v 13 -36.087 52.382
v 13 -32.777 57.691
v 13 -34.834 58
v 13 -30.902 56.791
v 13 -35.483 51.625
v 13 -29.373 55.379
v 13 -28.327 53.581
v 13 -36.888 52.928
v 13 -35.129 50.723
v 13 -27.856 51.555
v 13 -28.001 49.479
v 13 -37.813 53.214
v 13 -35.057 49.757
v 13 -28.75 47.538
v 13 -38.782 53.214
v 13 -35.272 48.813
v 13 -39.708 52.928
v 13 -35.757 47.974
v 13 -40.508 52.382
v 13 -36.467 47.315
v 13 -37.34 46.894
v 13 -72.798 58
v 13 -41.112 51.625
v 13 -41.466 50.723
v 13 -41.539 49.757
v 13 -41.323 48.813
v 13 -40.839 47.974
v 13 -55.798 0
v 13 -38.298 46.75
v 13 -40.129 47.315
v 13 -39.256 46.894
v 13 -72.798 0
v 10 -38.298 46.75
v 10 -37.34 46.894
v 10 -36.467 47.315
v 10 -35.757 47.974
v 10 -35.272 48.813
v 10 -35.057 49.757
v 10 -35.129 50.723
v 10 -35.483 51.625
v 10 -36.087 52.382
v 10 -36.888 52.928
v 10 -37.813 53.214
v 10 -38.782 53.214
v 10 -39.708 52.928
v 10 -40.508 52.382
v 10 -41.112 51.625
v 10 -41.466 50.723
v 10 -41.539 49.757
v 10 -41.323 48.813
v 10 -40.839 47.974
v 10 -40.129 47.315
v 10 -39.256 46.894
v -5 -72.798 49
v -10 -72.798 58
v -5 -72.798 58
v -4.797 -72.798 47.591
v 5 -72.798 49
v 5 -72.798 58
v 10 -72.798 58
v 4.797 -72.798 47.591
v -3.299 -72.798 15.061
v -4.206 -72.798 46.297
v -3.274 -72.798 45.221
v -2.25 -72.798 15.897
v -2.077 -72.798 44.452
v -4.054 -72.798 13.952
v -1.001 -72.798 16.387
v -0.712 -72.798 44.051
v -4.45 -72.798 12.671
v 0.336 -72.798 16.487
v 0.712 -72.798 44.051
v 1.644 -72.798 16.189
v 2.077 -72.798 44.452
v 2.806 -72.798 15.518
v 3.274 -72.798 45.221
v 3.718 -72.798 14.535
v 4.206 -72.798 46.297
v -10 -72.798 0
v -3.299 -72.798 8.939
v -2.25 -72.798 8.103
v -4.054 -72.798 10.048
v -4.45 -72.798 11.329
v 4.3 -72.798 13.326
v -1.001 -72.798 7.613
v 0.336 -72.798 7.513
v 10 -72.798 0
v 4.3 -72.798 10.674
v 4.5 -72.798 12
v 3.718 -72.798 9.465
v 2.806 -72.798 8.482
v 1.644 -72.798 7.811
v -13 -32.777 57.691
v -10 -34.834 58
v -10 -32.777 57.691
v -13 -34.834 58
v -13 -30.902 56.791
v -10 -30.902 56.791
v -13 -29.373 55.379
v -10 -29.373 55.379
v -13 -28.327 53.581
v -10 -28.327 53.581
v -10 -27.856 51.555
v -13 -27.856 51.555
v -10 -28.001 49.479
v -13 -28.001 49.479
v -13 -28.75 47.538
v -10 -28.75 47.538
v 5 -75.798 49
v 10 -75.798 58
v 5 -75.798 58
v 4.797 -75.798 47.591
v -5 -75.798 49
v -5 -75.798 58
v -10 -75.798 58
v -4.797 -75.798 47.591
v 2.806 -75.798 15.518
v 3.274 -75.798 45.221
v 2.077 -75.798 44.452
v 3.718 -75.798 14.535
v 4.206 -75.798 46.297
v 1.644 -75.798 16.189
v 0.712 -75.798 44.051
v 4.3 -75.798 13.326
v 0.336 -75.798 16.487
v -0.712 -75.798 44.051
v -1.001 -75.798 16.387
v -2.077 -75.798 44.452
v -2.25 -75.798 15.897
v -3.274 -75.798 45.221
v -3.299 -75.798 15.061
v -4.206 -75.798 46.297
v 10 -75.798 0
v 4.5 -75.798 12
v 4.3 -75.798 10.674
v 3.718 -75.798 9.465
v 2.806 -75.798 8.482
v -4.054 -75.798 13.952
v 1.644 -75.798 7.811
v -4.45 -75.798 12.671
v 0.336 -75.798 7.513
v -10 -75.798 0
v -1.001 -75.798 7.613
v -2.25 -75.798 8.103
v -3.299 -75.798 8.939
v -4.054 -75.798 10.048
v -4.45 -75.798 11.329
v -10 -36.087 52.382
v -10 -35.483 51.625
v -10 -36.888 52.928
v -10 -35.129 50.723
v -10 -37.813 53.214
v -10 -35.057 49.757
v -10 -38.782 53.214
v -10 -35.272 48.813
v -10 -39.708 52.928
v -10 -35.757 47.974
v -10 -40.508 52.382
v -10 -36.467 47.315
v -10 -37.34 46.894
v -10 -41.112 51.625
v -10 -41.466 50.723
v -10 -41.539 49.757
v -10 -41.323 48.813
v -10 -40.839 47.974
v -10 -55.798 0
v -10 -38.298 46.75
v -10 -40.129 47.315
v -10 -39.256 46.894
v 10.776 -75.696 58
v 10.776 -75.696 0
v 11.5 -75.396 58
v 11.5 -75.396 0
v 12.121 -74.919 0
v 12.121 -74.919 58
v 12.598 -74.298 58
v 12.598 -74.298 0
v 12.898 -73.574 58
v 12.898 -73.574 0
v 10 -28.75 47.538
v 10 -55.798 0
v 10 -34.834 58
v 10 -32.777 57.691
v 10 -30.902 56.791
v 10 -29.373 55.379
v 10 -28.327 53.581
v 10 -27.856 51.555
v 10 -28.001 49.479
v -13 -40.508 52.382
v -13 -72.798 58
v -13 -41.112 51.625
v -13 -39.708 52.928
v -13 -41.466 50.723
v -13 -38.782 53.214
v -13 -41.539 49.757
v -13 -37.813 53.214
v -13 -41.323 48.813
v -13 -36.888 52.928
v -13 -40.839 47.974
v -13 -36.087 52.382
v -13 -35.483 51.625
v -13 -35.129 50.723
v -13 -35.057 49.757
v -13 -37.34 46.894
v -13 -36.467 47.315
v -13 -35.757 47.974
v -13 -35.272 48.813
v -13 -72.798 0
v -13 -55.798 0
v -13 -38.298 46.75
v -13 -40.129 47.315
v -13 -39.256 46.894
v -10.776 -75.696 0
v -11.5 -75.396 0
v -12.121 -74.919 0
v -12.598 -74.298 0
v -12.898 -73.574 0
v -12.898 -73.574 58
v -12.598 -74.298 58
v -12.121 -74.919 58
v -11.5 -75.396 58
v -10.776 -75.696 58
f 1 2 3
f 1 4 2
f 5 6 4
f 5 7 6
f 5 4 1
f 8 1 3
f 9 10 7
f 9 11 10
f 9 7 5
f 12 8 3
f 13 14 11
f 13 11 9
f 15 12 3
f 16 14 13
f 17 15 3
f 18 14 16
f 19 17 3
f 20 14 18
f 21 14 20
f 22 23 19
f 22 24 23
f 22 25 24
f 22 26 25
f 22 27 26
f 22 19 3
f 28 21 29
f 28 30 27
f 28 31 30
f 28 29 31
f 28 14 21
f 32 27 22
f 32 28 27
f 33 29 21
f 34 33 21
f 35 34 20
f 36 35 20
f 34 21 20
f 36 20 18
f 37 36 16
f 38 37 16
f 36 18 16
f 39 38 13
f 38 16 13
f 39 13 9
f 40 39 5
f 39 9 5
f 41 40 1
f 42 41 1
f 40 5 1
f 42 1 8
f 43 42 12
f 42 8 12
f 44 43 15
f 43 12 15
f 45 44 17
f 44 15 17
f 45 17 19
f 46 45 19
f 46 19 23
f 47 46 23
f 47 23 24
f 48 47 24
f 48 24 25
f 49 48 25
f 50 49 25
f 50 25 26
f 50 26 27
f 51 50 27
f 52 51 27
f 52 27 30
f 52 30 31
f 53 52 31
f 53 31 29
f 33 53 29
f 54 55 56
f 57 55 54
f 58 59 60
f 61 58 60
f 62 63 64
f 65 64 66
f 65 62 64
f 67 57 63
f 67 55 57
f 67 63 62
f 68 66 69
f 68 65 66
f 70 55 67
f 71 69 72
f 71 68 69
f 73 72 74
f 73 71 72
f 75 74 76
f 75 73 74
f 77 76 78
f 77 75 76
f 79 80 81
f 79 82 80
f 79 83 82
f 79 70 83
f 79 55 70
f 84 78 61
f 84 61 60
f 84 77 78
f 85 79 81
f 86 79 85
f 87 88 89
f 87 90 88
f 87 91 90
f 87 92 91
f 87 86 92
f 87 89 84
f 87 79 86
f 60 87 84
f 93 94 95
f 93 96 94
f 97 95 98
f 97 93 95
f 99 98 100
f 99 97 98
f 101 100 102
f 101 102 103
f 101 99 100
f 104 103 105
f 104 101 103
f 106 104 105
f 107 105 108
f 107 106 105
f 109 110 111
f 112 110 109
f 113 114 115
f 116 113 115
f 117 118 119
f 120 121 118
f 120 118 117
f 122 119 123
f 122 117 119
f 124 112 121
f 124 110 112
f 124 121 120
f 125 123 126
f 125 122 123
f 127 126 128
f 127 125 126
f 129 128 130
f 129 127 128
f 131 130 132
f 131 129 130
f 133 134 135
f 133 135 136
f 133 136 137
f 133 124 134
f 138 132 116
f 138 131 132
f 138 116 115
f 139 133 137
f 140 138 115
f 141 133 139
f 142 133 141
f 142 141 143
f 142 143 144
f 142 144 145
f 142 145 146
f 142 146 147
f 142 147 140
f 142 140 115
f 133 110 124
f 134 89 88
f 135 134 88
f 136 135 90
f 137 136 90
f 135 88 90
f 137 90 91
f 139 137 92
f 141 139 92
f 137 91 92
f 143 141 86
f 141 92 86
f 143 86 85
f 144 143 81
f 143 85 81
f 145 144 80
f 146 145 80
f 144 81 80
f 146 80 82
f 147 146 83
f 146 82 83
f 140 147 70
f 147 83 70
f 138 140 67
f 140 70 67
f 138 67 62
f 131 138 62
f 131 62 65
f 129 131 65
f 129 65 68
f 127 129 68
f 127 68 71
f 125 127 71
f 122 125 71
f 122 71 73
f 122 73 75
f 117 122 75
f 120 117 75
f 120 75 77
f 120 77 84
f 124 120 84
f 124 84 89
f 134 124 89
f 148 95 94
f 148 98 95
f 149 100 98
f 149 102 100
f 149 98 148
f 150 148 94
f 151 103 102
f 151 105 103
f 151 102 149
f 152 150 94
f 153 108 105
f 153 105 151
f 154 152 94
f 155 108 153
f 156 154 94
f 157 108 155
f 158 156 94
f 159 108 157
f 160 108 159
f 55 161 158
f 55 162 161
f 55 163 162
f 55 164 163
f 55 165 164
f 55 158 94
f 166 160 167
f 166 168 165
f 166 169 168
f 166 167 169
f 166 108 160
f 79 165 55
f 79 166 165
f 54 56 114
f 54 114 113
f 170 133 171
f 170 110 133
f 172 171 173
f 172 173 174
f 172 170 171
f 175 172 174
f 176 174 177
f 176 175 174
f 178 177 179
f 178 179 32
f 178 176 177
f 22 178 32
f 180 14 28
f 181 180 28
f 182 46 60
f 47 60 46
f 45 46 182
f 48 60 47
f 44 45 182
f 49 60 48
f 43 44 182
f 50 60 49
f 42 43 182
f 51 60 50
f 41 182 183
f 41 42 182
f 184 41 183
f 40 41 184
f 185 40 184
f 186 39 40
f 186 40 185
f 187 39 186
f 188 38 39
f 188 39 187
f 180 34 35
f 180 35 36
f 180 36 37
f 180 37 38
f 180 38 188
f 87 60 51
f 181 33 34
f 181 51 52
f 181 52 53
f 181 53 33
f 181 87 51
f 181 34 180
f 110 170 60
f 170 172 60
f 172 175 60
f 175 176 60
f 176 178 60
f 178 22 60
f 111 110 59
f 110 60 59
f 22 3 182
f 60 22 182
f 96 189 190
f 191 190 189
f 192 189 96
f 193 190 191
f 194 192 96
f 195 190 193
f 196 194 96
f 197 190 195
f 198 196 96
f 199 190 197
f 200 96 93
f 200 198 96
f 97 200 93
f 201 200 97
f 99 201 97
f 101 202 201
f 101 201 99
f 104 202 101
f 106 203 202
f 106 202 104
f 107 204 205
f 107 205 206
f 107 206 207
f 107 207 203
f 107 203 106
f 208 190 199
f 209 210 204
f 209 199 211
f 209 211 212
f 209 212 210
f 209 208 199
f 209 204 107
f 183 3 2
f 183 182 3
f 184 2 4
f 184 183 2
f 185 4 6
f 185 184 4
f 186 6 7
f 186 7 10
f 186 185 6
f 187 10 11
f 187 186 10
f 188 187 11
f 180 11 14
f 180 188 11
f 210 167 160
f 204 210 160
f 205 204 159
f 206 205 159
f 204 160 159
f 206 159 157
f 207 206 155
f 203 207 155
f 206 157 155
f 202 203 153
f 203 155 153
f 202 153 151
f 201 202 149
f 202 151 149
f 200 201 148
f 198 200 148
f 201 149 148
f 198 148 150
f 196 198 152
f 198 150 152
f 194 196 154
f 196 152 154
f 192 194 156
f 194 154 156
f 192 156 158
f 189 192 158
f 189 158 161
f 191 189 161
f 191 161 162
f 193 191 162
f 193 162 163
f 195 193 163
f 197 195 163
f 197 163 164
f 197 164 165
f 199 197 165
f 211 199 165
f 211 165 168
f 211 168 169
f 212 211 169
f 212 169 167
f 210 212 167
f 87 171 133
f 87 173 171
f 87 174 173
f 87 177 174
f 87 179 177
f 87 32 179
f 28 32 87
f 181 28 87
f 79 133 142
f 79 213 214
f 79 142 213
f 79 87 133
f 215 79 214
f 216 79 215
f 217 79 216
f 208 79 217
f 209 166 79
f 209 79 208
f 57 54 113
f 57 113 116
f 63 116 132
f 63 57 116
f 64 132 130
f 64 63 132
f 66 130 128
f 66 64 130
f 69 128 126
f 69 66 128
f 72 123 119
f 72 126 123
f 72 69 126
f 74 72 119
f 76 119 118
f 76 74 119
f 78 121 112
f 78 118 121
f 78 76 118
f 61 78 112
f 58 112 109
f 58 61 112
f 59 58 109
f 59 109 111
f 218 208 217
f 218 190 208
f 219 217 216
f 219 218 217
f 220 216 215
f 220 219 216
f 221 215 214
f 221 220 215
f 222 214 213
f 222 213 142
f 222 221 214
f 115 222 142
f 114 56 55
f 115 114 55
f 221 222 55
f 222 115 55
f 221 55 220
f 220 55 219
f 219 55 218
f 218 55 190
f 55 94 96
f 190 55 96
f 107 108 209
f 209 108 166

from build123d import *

# Parameters (mm, degrees)
EXTRUDE_1_DEPTH     = 58
SKETCH_2_R          = 3.25
CUT_EXTRUDE_1_DEPTH = 27
FILLET_1_R          = 7
SKETCH_3_R          = 4.5
CUT_EXTRUDE_2_DEPTH = 4
FILLET_2_R          = 3


with BuildPart() as part:
    # 草图1 → 凸台-拉伸1 (new body)
    with BuildSketch(Plane.XY):
        Polygon((-10, -20.797836643), (-10, -72.797836643), (10, -72.797836643), (10, -20.797836643), (13, -20.797836643), (13, -75.797836643), (-13, -75.797836643), (-13, -20.797836643), align=None)
    extrude(amount=EXTRUDE_1_DEPTH)

    # 草图2 → 切除-拉伸1 (cut, through all)
    with BuildSketch(Plane(origin=(13, 0, 0), x_dir=(0, 0, -1), z_dir=(1, 0, 0))):
        with Locations((-50, -38.297836643)):
            Circle(SKETCH_2_R)
        Polygon((-58, -20.797836643), (-58, -22.797836643), (0, -55.797836643), (0, -20.797836643), align=None)
    extrude(amount=-CUT_EXTRUDE_1_DEPTH, mode=Mode.SUBTRACT)

    # 圆角1
    fillet_1_edges = [part.edges().sort_by_distance(p)[0] for p in [
        (11.5, -22.797836643, 58),
        (-11.5, -22.797836643, 58),
    ]]
    fillet(fillet_1_edges, radius=FILLET_1_R)

    # 草图3 → 切除-拉伸2 (cut, through all)
    with BuildSketch(Plane(origin=(0, -72.797836643, 0), x_dir=(1, 0, 0), z_dir=(0, 1, 0))):
        with Locations((0, -12)):
            Circle(SKETCH_3_R)
        with BuildLine():
            Line((5, -49), (5, -58))
            Line((5, -58), (-5, -58))
            Line((-5, -58), (-5, -49))
            ThreePointArc((-5, -49), (0, -44), (5, -49))
        make_face()
    extrude(amount=-CUT_EXTRUDE_2_DEPTH, mode=Mode.SUBTRACT)

    # 圆角2
    fillet_2_edges = [part.edges().sort_by_distance(p)[0] for p in [
        (13, -75.797836643, 29),
        (-13, -75.797836643, 29),
    ]]
    fillet(fillet_2_edges, radius=FILLET_2_R)


solid = part.part
